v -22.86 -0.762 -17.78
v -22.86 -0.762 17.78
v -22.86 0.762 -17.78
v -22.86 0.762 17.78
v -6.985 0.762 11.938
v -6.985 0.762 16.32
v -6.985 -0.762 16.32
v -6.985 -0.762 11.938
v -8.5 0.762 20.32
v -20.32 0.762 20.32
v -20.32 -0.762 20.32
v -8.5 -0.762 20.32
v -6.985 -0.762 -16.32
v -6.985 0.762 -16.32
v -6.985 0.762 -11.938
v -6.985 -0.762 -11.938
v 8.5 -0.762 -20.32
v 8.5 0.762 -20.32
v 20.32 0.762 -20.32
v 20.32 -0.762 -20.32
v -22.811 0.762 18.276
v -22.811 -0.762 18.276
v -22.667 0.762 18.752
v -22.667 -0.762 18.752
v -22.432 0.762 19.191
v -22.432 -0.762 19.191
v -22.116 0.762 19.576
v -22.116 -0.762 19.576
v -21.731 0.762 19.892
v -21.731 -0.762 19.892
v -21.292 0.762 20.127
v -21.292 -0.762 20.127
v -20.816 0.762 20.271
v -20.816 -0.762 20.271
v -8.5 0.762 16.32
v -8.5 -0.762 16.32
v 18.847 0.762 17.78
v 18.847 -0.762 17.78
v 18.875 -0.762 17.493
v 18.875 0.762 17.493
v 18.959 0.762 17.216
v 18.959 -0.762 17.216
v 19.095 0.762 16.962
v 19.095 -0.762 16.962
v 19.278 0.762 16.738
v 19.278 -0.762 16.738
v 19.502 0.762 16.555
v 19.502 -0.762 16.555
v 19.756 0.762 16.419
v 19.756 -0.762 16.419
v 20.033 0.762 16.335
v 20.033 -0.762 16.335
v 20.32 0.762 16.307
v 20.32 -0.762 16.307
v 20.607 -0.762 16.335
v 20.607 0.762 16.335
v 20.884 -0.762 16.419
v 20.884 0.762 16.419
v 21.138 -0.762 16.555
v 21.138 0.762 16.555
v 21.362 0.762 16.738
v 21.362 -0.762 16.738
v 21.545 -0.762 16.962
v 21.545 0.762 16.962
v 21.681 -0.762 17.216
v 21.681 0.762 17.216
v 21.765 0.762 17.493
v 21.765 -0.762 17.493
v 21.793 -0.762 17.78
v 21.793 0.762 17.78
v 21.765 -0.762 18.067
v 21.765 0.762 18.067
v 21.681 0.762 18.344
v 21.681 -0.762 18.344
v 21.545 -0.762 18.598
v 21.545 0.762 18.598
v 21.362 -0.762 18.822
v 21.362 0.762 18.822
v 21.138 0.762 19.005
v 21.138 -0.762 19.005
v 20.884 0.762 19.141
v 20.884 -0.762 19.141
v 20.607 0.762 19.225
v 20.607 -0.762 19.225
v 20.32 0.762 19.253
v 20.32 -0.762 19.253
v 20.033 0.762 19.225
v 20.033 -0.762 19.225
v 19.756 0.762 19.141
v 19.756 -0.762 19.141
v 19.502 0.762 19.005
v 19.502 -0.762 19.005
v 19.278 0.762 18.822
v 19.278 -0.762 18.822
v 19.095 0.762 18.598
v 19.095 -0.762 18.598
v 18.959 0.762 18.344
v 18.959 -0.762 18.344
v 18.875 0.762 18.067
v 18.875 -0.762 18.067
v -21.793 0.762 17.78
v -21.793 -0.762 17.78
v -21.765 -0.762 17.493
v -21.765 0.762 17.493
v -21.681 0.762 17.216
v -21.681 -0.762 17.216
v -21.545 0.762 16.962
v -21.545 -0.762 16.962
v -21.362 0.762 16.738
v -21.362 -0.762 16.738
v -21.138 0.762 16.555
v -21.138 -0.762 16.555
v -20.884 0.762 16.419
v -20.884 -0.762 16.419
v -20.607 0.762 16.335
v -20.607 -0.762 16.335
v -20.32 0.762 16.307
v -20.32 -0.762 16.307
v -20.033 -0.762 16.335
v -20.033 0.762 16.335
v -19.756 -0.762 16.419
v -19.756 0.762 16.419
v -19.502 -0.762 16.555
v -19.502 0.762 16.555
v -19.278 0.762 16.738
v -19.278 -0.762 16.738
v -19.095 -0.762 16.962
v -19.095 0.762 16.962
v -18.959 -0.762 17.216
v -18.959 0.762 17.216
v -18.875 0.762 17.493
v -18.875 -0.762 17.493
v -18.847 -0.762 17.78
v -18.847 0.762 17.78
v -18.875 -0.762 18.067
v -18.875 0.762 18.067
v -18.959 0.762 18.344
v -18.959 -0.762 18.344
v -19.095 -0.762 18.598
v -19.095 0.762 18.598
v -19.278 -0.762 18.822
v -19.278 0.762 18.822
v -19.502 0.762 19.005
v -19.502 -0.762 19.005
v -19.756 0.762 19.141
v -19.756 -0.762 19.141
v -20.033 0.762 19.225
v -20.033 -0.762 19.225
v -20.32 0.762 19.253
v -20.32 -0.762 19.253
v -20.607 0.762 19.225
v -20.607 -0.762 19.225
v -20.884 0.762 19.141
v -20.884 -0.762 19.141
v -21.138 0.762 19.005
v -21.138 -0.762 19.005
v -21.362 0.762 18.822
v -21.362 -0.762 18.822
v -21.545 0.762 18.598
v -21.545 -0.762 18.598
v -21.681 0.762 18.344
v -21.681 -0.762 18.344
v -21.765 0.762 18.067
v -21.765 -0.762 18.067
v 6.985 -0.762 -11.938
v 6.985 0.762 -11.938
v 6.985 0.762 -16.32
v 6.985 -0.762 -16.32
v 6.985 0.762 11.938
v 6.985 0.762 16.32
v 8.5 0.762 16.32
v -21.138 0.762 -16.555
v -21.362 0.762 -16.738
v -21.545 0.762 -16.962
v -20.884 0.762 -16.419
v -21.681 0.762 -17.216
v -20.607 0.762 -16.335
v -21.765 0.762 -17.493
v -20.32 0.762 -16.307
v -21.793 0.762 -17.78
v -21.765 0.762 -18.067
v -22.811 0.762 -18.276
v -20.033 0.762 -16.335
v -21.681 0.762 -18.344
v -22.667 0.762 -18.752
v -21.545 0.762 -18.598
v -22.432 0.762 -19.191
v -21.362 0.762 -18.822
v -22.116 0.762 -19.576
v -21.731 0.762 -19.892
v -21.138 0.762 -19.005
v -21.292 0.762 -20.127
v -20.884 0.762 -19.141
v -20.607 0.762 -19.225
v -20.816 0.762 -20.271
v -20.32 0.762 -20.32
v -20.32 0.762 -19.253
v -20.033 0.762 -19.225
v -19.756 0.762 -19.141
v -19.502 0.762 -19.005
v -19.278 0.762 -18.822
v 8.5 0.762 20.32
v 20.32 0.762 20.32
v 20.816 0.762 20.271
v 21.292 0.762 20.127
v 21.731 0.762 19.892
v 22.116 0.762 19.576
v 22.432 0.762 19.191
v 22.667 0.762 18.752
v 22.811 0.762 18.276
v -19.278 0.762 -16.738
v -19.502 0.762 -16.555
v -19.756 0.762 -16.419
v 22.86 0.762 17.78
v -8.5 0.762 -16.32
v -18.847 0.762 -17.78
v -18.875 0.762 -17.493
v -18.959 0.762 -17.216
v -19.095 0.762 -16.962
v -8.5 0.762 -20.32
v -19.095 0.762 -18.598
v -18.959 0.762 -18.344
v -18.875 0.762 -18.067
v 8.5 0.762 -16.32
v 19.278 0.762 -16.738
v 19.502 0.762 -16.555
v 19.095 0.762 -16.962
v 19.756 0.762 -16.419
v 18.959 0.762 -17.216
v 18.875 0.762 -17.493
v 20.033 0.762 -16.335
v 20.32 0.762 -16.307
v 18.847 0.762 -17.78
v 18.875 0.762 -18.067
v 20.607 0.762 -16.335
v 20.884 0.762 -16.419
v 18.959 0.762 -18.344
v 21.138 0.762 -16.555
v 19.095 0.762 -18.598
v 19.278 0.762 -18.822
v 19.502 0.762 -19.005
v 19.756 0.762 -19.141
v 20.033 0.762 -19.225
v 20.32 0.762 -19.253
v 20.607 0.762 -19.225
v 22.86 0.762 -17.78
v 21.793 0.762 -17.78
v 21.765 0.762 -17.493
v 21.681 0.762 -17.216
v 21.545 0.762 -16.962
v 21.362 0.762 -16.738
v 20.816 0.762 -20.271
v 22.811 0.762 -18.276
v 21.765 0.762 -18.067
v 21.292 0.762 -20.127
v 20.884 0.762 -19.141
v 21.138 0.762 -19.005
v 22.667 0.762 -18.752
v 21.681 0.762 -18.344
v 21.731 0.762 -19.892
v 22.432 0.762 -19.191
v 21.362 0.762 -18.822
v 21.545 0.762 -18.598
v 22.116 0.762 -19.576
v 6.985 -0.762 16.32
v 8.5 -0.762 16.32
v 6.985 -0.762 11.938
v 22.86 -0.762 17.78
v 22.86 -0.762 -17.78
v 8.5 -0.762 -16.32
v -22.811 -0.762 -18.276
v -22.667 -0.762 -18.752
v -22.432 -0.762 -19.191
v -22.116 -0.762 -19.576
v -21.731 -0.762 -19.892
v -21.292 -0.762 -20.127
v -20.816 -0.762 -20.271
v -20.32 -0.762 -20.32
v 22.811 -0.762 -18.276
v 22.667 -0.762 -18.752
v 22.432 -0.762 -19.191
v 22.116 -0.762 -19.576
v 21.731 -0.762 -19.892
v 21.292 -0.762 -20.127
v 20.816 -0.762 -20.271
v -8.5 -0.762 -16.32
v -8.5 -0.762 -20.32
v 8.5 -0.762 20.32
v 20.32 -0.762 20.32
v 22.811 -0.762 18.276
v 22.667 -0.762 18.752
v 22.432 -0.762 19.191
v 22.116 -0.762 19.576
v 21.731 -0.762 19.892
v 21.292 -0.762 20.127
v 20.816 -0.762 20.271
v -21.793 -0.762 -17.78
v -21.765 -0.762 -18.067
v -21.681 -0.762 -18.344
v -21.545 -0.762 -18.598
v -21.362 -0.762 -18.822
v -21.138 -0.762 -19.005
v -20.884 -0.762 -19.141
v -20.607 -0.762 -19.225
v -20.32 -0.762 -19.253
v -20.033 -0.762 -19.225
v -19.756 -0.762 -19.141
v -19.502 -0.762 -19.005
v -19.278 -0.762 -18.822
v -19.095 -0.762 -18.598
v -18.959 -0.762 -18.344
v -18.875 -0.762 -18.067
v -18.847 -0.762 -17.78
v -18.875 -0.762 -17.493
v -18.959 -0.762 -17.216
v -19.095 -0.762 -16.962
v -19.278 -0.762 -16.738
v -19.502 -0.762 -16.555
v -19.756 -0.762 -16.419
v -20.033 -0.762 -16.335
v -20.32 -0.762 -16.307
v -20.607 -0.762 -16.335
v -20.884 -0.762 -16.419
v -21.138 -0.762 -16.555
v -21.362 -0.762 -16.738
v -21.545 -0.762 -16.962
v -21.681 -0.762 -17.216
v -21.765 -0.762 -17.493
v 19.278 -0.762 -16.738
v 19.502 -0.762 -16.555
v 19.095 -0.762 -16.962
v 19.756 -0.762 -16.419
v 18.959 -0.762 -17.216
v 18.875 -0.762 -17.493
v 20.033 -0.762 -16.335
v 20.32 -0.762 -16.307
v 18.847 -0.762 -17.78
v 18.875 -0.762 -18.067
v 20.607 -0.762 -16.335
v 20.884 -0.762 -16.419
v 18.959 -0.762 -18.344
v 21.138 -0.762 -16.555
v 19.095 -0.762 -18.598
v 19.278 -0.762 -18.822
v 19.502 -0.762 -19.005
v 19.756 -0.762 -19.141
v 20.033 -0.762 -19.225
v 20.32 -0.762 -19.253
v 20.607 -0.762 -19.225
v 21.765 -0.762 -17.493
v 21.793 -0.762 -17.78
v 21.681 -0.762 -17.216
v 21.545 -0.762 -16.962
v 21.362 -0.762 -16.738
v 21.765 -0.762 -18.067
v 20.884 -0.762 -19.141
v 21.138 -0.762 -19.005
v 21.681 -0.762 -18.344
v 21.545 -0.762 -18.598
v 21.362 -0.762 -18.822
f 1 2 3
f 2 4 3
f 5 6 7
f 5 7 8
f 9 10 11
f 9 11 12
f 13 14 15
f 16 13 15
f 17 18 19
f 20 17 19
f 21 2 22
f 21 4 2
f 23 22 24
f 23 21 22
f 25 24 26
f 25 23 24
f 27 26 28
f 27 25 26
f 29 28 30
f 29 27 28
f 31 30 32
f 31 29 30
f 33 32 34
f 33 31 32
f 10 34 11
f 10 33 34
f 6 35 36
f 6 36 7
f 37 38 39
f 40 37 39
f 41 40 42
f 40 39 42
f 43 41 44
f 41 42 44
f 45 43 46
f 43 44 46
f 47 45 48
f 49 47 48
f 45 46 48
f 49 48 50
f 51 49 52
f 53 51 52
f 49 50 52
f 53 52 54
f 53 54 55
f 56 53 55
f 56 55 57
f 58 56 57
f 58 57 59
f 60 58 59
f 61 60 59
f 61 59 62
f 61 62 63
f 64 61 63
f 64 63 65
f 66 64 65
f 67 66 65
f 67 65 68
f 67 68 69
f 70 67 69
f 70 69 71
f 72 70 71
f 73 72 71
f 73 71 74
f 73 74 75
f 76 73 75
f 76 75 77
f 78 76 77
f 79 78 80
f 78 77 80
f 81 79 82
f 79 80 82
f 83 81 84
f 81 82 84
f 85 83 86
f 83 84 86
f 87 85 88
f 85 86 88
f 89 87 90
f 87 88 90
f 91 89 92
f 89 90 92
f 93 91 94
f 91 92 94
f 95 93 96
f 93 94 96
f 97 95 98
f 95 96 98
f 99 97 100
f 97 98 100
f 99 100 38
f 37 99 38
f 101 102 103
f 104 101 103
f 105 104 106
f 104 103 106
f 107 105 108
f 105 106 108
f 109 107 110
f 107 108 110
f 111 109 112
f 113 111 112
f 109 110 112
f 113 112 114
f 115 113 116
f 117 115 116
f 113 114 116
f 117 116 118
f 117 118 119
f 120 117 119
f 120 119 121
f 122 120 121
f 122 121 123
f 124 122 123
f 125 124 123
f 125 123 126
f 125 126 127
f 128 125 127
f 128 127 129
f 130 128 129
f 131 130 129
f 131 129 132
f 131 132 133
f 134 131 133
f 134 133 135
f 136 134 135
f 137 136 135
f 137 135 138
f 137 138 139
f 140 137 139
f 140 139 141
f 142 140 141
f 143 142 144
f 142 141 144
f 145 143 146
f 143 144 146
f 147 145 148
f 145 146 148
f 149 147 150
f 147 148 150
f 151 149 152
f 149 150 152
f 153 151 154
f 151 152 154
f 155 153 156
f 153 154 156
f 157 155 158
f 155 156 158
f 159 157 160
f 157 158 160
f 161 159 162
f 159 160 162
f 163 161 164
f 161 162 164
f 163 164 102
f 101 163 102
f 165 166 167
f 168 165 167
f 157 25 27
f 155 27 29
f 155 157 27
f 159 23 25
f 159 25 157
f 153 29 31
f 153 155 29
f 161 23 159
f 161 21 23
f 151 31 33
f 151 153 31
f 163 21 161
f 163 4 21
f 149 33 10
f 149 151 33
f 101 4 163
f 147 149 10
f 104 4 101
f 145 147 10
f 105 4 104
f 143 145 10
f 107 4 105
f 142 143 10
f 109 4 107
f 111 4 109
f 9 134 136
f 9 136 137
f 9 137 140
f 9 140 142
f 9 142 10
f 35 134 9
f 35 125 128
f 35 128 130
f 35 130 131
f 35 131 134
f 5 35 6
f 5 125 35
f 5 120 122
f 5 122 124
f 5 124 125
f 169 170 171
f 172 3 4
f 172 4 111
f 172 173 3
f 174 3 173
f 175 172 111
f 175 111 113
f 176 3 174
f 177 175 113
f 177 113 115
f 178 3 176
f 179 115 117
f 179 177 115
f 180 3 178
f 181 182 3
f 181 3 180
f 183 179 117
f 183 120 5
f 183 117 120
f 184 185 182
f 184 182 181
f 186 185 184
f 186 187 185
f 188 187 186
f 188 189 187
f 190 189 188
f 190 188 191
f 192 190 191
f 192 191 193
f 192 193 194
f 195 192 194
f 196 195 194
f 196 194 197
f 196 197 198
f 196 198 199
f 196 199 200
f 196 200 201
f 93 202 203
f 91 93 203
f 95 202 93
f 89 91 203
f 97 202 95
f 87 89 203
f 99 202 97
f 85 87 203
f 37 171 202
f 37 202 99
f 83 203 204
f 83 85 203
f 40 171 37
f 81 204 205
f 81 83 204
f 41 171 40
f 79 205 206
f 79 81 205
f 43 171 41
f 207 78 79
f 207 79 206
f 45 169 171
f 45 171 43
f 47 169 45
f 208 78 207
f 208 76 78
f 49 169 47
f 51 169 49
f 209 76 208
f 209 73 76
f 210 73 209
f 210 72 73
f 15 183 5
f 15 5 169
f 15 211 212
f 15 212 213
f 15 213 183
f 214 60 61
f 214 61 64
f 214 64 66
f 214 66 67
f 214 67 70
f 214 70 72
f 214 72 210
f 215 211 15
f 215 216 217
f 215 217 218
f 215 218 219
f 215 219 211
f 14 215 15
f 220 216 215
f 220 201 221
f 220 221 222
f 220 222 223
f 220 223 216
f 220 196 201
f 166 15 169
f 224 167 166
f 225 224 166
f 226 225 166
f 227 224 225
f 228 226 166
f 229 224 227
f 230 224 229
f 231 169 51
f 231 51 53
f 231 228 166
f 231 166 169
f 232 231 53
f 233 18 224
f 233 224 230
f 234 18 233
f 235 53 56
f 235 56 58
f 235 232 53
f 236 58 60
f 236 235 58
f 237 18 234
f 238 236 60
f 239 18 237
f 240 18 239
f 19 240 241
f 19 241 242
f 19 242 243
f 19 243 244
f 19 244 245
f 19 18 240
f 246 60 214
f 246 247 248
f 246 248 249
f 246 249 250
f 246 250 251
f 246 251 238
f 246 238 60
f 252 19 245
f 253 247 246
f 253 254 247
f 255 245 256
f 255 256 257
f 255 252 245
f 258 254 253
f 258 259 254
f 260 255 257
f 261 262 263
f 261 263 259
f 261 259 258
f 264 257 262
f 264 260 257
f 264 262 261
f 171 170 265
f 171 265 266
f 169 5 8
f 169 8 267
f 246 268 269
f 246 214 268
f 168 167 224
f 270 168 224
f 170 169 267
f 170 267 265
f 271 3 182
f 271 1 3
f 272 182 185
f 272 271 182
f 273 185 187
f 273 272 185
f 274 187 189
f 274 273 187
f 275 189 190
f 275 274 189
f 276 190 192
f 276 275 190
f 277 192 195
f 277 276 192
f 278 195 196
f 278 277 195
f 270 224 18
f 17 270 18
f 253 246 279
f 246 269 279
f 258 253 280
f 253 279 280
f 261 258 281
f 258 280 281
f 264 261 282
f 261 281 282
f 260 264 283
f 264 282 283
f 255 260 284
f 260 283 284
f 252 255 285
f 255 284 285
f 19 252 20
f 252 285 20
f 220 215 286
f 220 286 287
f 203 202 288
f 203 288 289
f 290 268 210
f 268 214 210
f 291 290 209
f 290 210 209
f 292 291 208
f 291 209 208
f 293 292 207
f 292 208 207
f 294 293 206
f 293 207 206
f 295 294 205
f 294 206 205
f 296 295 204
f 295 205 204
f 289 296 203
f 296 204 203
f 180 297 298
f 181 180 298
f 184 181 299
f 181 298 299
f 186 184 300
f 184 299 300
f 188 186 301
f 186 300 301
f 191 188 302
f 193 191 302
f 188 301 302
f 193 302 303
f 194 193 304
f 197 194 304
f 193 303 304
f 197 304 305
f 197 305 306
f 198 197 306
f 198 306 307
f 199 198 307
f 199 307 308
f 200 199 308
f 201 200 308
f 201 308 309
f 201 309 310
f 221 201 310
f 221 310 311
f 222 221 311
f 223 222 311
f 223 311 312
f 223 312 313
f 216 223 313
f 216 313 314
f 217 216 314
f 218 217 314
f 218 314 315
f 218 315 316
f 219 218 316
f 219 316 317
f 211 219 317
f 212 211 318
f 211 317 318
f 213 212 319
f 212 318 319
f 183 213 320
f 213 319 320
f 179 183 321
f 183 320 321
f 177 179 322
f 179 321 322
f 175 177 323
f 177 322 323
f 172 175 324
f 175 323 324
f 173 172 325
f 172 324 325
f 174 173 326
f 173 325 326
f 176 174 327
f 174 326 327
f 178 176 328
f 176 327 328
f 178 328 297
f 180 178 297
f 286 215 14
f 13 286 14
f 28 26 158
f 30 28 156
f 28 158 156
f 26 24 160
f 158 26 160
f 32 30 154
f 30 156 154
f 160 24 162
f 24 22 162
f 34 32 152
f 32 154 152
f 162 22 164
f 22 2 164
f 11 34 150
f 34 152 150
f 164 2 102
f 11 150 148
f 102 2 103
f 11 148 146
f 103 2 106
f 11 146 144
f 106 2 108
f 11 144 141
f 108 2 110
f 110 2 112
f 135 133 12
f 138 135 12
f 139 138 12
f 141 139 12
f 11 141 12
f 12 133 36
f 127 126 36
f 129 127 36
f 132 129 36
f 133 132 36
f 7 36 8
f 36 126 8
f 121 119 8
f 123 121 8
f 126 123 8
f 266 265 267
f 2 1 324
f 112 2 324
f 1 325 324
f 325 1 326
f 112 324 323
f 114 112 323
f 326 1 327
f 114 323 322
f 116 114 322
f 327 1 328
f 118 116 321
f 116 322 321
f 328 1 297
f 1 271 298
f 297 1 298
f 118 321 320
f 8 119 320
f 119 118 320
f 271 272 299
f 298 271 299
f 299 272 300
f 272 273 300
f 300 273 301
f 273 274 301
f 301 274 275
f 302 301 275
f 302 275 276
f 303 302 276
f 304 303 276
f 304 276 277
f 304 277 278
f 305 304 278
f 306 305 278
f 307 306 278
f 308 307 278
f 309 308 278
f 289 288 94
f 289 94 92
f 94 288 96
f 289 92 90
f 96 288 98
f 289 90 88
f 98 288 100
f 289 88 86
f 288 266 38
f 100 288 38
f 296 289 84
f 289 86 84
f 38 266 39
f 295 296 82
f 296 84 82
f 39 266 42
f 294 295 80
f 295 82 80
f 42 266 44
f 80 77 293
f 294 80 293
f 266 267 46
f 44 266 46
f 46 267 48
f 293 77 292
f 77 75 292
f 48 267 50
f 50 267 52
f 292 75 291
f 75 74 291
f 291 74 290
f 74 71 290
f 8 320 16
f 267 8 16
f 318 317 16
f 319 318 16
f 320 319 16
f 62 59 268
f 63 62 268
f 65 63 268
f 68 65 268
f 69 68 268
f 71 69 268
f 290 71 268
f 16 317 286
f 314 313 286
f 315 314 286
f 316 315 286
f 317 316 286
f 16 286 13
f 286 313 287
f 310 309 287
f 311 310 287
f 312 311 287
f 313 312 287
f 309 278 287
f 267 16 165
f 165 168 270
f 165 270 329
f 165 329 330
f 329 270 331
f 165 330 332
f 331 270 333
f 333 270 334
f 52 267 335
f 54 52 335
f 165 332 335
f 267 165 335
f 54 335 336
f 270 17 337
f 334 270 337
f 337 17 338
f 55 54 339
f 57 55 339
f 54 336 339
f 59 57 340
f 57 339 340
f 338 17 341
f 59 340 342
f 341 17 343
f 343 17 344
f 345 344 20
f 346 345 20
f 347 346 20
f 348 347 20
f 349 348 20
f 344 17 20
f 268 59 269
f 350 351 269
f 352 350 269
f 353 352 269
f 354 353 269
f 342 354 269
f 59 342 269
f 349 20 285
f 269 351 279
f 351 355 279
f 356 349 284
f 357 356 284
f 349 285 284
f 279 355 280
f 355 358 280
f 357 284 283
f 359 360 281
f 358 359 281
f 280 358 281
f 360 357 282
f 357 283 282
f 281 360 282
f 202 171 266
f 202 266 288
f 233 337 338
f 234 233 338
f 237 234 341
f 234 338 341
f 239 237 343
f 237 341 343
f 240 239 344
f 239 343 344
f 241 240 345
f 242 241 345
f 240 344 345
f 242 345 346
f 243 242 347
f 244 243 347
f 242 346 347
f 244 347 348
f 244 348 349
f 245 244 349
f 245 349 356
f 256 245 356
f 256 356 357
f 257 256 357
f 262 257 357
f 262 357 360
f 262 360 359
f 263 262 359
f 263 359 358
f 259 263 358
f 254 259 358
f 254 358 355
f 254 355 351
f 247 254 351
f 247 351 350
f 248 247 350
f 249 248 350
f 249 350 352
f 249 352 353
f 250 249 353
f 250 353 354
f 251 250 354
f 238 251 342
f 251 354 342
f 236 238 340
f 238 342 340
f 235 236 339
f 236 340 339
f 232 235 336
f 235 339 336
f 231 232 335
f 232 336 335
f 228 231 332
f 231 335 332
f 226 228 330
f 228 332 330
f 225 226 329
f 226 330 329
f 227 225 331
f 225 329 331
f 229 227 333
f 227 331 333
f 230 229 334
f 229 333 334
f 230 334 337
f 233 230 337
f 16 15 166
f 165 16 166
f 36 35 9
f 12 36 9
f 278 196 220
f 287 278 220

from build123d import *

# Parameters (mm, degrees)
SKETCH1_W             = 45.72
SKETCH1_H             = 40.64
BOSS_EXTRUDE1_DEPTH   = 0.762
FILLET1_R             = 2.54
F_4_CLEARANCE_HOLE1_D = 2.9464
SKETCH4_W             = 1.515
SKETCH4_H             = 4
CUT_EXTRUDE1_DEPTH    = 2.524


with BuildPart() as part:
    # Sketch1 → Boss-Extrude1 (new body, symmetric)
    with BuildSketch(Plane(origin=(0, 0, 0), x_dir=(1, 0, 0), z_dir=(0, 1, 0))):
        Rectangle(SKETCH1_W, SKETCH1_H)
    extrude(amount=BOSS_EXTRUDE1_DEPTH, both=True)

    # Fillet1
    fillet1_edges = [part.edges().sort_by_distance(p)[0] for p in [
        (22.86, 0, 20.32),
        (-22.86, 0, 20.32),
        (-22.86, 0, -20.32),
        (22.86, 0, -20.32),
    ]]
    fillet(fillet1_edges, radius=FILLET1_R)

    # #4 Clearance Hole1 (through all)
    with Locations(Plane(origin=(0, 0.762, 0), x_dir=(1, 0, 0), z_dir=(0, 1, 0))):
        with Locations((20.32, 17.78), (-20.32, -17.78), (-20.32, 17.78), (20.32, -17.78)):
            Hole(F_4_CLEARANCE_HOLE1_D / 2)

    # Sketch4 → Cut-Extrude1 (cut, through all)
    with BuildSketch(Plane(origin=(0, 0.762, 0), x_dir=(1, 0, 0), z_dir=(0, 1, 0))):
        Polygon((6.985, 16.32), (6.985, 20.32), (-6.985, 20.32), (-6.985, 16.32), (-6.985, 11.938), (6.985, 11.938), align=None)
        with Locations((7.7425, 18.32)):
            Rectangle(SKETCH4_W, SKETCH4_H)
        with Locations((-7.7425, 18.32)):
            Rectangle(SKETCH4_W, SKETCH4_H)
    cut_extrude1 = extrude(amount=-CUT_EXTRUDE1_DEPTH, mode=Mode.SUBTRACT)

    # Mirror1: Cut-Extrude1 across plane
    add(cut_extrude1.mirror(Plane.XY), mode=Mode.SUBTRACT)


solid = part.part
